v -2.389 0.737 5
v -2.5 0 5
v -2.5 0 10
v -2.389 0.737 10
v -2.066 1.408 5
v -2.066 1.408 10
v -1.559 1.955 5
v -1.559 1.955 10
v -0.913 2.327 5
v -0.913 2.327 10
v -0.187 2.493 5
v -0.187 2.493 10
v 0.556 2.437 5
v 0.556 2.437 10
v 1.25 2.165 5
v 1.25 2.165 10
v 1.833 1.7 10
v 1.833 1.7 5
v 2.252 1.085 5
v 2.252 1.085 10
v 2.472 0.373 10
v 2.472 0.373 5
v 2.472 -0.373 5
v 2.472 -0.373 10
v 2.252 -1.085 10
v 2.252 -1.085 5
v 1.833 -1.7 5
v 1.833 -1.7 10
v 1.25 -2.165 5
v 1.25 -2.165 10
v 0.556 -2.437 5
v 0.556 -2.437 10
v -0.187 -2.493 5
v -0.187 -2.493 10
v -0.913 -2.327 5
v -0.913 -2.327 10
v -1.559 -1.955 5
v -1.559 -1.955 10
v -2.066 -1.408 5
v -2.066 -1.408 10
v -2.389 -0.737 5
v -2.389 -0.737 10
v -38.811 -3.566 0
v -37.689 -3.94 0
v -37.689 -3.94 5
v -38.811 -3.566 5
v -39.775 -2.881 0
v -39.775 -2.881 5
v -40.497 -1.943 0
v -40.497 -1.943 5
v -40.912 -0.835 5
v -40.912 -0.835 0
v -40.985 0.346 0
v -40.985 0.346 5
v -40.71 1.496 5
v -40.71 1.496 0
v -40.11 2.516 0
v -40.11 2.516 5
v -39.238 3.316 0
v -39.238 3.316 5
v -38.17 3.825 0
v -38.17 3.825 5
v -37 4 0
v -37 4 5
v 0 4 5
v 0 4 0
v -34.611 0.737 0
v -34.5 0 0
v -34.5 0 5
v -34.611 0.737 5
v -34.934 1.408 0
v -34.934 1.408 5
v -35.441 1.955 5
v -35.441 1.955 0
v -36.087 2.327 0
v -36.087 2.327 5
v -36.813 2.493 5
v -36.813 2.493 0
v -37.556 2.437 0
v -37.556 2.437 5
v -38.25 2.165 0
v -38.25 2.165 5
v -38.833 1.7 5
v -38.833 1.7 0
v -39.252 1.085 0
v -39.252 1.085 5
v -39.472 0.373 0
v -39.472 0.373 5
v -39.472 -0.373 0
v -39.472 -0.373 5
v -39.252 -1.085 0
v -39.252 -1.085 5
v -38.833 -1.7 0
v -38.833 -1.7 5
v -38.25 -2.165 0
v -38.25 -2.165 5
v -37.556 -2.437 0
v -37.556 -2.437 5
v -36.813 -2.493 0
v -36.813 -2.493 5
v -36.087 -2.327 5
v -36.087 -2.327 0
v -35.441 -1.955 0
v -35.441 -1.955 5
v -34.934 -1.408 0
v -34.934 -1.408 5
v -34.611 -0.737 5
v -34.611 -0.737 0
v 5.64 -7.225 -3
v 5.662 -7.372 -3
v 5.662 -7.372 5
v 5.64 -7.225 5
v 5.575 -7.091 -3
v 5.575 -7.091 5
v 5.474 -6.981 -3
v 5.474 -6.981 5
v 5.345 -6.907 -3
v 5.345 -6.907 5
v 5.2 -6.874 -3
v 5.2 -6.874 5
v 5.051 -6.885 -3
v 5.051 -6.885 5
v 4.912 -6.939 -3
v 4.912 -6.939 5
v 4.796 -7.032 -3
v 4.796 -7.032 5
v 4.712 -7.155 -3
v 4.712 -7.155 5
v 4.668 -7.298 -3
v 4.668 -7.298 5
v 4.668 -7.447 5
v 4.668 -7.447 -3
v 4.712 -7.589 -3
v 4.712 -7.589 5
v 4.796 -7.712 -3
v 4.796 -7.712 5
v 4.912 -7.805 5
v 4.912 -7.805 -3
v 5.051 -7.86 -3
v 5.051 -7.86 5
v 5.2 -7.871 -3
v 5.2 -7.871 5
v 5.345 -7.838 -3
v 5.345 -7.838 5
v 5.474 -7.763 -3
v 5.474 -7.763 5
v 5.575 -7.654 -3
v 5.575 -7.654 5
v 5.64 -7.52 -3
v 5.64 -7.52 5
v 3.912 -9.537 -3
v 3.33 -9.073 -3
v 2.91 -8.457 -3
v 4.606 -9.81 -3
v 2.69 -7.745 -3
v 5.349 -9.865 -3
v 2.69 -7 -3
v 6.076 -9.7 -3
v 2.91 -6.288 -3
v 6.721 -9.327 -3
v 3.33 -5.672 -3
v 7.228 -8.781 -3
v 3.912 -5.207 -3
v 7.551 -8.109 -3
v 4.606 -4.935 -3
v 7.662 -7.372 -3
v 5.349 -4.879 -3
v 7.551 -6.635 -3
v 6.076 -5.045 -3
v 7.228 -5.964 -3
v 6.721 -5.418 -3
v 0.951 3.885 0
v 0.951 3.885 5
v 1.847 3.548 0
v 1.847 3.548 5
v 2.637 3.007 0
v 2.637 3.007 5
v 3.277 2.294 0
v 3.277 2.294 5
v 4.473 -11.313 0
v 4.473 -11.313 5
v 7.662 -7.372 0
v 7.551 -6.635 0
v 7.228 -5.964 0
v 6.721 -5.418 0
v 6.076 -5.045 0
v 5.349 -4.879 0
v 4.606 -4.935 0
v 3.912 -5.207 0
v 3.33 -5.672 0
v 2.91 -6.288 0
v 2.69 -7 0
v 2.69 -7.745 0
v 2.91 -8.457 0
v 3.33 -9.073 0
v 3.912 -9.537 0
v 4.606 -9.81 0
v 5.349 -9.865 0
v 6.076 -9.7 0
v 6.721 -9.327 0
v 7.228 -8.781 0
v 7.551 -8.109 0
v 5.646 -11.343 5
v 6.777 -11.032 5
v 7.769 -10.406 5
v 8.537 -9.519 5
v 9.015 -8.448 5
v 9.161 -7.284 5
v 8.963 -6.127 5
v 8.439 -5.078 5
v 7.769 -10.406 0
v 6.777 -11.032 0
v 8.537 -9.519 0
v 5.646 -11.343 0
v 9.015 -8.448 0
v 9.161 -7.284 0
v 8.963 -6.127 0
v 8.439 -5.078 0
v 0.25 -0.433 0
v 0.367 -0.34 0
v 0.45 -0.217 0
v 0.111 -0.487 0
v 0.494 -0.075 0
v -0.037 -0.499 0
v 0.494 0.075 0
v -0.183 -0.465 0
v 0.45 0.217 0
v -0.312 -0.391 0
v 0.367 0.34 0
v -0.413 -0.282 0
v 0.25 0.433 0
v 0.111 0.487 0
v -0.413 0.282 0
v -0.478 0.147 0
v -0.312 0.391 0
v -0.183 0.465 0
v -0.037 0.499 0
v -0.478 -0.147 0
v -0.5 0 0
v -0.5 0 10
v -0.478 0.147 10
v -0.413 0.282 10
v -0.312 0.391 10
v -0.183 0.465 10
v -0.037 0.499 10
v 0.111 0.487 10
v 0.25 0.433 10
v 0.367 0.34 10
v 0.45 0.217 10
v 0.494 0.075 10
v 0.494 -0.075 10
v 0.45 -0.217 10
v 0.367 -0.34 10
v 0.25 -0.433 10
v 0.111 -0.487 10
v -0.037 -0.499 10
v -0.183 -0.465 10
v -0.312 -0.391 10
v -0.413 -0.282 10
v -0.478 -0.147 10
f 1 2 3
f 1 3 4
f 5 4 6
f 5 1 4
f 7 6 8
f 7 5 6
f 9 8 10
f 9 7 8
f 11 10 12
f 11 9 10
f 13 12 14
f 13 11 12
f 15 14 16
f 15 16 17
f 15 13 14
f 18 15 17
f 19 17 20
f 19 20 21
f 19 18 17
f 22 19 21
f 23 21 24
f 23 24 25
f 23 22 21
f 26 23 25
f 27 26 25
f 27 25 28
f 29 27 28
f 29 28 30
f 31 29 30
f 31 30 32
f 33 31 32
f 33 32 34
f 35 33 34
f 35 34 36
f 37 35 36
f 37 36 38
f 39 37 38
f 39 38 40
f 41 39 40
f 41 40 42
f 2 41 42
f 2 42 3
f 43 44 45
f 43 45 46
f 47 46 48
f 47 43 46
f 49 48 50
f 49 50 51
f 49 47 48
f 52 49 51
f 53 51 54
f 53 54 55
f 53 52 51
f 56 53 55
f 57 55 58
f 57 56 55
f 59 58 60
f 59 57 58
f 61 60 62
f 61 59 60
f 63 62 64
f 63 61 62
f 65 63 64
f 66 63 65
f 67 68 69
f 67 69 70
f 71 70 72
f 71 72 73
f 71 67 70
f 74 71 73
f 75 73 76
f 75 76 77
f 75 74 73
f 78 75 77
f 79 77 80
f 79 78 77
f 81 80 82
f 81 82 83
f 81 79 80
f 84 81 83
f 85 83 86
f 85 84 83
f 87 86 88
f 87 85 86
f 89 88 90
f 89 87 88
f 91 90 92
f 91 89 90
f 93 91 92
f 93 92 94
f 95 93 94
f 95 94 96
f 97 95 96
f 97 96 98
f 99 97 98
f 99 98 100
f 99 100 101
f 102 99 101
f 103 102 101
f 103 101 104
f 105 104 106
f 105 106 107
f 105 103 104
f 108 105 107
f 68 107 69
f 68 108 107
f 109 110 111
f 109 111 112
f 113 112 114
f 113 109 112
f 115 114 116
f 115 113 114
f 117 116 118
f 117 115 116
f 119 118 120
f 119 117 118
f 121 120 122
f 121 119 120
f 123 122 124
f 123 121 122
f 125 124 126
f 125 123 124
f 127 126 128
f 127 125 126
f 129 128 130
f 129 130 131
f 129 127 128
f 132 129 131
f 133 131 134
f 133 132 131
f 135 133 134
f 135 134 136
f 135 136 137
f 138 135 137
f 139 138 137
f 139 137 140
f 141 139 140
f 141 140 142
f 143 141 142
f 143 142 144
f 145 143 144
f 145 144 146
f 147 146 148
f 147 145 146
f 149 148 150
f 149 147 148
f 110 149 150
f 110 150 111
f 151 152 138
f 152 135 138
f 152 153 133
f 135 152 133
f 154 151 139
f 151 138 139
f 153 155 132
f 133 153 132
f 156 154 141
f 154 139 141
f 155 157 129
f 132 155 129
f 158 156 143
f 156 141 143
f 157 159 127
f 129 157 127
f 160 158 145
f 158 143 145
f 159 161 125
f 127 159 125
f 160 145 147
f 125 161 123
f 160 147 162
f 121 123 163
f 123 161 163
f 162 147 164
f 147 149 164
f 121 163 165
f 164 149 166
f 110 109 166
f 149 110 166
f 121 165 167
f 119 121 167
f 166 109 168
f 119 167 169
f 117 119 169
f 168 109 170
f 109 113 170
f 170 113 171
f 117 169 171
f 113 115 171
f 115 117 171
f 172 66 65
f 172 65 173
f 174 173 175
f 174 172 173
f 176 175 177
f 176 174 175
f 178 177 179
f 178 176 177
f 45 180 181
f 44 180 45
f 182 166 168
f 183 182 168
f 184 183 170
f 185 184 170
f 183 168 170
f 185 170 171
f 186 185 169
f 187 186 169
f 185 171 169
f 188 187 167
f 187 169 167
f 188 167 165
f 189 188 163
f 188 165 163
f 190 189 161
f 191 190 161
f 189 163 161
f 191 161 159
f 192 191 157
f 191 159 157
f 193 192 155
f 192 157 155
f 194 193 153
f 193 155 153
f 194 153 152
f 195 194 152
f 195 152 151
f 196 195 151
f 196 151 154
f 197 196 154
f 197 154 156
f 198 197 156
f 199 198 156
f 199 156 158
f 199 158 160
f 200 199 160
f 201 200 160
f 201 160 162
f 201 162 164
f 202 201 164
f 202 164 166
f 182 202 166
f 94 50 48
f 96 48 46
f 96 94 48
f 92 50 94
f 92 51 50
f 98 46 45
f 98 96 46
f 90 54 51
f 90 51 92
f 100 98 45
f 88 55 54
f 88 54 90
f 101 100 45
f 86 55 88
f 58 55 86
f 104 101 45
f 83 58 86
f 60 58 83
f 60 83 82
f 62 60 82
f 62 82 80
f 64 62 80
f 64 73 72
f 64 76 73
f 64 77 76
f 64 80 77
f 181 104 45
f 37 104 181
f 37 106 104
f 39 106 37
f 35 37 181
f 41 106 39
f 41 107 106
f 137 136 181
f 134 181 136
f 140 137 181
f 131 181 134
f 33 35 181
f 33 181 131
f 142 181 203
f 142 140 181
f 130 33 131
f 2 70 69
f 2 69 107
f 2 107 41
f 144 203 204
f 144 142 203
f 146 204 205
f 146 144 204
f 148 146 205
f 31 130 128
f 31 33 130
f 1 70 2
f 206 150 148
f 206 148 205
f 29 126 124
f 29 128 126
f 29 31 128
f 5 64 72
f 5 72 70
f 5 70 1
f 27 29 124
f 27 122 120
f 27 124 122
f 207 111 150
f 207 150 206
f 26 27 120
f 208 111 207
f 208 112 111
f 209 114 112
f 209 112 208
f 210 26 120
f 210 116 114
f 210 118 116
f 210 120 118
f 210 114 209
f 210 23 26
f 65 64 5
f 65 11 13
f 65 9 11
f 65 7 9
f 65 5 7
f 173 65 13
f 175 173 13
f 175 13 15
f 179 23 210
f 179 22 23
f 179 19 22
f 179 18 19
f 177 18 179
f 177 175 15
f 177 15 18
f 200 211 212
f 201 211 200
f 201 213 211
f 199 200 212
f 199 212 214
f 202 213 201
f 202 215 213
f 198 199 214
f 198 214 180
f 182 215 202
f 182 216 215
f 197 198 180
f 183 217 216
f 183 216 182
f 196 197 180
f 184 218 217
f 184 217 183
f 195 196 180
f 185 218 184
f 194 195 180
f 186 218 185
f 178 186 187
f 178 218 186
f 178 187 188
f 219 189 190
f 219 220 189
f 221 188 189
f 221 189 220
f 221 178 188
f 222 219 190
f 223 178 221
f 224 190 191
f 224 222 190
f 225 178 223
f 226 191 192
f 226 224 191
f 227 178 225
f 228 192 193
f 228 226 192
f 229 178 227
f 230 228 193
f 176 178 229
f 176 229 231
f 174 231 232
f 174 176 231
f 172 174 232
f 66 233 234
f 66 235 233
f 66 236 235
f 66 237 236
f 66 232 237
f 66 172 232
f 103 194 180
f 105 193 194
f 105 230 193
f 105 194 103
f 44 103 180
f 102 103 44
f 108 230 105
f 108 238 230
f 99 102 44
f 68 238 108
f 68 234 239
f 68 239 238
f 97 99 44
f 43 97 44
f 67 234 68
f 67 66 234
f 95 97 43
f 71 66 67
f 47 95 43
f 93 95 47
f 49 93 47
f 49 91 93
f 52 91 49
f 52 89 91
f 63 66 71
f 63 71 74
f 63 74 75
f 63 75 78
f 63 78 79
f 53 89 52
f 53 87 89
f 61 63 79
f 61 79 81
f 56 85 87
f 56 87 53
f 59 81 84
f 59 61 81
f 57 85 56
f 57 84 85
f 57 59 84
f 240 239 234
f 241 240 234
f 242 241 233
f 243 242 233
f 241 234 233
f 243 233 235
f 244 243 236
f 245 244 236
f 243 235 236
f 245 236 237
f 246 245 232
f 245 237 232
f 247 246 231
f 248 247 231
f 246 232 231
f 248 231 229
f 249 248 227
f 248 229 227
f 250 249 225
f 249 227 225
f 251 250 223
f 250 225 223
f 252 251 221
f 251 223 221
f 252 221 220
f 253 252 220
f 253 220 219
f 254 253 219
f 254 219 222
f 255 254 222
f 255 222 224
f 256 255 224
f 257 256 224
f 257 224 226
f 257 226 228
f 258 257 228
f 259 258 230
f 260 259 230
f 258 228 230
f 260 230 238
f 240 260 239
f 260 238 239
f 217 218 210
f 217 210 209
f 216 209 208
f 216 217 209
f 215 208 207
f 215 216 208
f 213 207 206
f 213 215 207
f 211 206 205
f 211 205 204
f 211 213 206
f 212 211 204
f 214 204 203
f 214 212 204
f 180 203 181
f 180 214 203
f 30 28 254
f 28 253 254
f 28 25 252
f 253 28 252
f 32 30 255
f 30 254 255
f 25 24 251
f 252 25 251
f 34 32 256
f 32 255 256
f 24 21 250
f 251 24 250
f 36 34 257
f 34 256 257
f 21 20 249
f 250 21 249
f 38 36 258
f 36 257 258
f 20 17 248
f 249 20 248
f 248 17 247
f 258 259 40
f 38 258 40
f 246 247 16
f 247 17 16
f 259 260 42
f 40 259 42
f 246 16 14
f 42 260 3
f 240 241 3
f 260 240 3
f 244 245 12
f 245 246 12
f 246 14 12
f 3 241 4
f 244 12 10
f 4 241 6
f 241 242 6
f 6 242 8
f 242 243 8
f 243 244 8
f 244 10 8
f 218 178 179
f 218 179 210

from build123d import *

# Parameters (mm, degrees)
SKETCH2_R           = 2.5
BOSS_EXTRUDE1_DEPTH = 5
BOSS_EXTRUDE2_START = -8
SKETCH3_R           = 2.5
SKETCH3_R_2         = 0.5
BOSS_EXTRUDE2_DEPTH = 8
SKETCH4_R           = 2.5
SKETCH4_R_2         = 0.5
BOSS_EXTRUDE3_DEPTH = 10


with BuildPart() as part:
    # Sketch2 → Boss-Extrude1 (new body)
    with BuildSketch(Plane.XY):
        with BuildLine():
            Line((-37, 4), (0, 4))
            ThreePointArc((0, 4), (1.846994453, 3.548043333), (3.276608177, 2.294305745))
            Line((3.276608177, 2.294305745), (8.438796104, -5.078062653))
            ThreePointArc((8.438796104, -5.078062653), (8.537284882, -9.519161483), (4.473211982, -11.31258567))
            Line((4.473211982, -11.31258567), (-37.688975946, -3.940217271))
            ThreePointArc((-37.688975946, -3.940217271), (-40.985026291, 0.345782384), (-37, 4))
        make_face()
        with Locations((-37, 0)):
            Circle(SKETCH2_R, mode=Mode.SUBTRACT)
        Circle(SKETCH2_R, mode=Mode.SUBTRACT)
        with Locations((5.162187927, -7.372368399)):
            Circle(SKETCH2_R, mode=Mode.SUBTRACT)
    extrude(amount=BOSS_EXTRUDE1_DEPTH)

    # Sketch3 → Boss-Extrude2 (add)
    with BuildSketch(Plane.XY.offset(5).offset(BOSS_EXTRUDE2_START)):
        with Locations((5.162187927, -7.372368399)):
            Circle(SKETCH3_R)
        with Locations((5.162187927, -7.372368399)):
            Circle(SKETCH3_R_2, mode=Mode.SUBTRACT)
    extrude(amount=BOSS_EXTRUDE2_DEPTH)

    # Sketch4 → Boss-Extrude3 (add)
    with BuildSketch(Plane(origin=(0, 0, 0), x_dir=(-1, 0, 0), z_dir=(0, 0, -1))):
        Circle(SKETCH4_R)
        Circle(SKETCH4_R_2, mode=Mode.SUBTRACT)
    extrude(amount=-BOSS_EXTRUDE3_DEPTH)


solid = part.part
